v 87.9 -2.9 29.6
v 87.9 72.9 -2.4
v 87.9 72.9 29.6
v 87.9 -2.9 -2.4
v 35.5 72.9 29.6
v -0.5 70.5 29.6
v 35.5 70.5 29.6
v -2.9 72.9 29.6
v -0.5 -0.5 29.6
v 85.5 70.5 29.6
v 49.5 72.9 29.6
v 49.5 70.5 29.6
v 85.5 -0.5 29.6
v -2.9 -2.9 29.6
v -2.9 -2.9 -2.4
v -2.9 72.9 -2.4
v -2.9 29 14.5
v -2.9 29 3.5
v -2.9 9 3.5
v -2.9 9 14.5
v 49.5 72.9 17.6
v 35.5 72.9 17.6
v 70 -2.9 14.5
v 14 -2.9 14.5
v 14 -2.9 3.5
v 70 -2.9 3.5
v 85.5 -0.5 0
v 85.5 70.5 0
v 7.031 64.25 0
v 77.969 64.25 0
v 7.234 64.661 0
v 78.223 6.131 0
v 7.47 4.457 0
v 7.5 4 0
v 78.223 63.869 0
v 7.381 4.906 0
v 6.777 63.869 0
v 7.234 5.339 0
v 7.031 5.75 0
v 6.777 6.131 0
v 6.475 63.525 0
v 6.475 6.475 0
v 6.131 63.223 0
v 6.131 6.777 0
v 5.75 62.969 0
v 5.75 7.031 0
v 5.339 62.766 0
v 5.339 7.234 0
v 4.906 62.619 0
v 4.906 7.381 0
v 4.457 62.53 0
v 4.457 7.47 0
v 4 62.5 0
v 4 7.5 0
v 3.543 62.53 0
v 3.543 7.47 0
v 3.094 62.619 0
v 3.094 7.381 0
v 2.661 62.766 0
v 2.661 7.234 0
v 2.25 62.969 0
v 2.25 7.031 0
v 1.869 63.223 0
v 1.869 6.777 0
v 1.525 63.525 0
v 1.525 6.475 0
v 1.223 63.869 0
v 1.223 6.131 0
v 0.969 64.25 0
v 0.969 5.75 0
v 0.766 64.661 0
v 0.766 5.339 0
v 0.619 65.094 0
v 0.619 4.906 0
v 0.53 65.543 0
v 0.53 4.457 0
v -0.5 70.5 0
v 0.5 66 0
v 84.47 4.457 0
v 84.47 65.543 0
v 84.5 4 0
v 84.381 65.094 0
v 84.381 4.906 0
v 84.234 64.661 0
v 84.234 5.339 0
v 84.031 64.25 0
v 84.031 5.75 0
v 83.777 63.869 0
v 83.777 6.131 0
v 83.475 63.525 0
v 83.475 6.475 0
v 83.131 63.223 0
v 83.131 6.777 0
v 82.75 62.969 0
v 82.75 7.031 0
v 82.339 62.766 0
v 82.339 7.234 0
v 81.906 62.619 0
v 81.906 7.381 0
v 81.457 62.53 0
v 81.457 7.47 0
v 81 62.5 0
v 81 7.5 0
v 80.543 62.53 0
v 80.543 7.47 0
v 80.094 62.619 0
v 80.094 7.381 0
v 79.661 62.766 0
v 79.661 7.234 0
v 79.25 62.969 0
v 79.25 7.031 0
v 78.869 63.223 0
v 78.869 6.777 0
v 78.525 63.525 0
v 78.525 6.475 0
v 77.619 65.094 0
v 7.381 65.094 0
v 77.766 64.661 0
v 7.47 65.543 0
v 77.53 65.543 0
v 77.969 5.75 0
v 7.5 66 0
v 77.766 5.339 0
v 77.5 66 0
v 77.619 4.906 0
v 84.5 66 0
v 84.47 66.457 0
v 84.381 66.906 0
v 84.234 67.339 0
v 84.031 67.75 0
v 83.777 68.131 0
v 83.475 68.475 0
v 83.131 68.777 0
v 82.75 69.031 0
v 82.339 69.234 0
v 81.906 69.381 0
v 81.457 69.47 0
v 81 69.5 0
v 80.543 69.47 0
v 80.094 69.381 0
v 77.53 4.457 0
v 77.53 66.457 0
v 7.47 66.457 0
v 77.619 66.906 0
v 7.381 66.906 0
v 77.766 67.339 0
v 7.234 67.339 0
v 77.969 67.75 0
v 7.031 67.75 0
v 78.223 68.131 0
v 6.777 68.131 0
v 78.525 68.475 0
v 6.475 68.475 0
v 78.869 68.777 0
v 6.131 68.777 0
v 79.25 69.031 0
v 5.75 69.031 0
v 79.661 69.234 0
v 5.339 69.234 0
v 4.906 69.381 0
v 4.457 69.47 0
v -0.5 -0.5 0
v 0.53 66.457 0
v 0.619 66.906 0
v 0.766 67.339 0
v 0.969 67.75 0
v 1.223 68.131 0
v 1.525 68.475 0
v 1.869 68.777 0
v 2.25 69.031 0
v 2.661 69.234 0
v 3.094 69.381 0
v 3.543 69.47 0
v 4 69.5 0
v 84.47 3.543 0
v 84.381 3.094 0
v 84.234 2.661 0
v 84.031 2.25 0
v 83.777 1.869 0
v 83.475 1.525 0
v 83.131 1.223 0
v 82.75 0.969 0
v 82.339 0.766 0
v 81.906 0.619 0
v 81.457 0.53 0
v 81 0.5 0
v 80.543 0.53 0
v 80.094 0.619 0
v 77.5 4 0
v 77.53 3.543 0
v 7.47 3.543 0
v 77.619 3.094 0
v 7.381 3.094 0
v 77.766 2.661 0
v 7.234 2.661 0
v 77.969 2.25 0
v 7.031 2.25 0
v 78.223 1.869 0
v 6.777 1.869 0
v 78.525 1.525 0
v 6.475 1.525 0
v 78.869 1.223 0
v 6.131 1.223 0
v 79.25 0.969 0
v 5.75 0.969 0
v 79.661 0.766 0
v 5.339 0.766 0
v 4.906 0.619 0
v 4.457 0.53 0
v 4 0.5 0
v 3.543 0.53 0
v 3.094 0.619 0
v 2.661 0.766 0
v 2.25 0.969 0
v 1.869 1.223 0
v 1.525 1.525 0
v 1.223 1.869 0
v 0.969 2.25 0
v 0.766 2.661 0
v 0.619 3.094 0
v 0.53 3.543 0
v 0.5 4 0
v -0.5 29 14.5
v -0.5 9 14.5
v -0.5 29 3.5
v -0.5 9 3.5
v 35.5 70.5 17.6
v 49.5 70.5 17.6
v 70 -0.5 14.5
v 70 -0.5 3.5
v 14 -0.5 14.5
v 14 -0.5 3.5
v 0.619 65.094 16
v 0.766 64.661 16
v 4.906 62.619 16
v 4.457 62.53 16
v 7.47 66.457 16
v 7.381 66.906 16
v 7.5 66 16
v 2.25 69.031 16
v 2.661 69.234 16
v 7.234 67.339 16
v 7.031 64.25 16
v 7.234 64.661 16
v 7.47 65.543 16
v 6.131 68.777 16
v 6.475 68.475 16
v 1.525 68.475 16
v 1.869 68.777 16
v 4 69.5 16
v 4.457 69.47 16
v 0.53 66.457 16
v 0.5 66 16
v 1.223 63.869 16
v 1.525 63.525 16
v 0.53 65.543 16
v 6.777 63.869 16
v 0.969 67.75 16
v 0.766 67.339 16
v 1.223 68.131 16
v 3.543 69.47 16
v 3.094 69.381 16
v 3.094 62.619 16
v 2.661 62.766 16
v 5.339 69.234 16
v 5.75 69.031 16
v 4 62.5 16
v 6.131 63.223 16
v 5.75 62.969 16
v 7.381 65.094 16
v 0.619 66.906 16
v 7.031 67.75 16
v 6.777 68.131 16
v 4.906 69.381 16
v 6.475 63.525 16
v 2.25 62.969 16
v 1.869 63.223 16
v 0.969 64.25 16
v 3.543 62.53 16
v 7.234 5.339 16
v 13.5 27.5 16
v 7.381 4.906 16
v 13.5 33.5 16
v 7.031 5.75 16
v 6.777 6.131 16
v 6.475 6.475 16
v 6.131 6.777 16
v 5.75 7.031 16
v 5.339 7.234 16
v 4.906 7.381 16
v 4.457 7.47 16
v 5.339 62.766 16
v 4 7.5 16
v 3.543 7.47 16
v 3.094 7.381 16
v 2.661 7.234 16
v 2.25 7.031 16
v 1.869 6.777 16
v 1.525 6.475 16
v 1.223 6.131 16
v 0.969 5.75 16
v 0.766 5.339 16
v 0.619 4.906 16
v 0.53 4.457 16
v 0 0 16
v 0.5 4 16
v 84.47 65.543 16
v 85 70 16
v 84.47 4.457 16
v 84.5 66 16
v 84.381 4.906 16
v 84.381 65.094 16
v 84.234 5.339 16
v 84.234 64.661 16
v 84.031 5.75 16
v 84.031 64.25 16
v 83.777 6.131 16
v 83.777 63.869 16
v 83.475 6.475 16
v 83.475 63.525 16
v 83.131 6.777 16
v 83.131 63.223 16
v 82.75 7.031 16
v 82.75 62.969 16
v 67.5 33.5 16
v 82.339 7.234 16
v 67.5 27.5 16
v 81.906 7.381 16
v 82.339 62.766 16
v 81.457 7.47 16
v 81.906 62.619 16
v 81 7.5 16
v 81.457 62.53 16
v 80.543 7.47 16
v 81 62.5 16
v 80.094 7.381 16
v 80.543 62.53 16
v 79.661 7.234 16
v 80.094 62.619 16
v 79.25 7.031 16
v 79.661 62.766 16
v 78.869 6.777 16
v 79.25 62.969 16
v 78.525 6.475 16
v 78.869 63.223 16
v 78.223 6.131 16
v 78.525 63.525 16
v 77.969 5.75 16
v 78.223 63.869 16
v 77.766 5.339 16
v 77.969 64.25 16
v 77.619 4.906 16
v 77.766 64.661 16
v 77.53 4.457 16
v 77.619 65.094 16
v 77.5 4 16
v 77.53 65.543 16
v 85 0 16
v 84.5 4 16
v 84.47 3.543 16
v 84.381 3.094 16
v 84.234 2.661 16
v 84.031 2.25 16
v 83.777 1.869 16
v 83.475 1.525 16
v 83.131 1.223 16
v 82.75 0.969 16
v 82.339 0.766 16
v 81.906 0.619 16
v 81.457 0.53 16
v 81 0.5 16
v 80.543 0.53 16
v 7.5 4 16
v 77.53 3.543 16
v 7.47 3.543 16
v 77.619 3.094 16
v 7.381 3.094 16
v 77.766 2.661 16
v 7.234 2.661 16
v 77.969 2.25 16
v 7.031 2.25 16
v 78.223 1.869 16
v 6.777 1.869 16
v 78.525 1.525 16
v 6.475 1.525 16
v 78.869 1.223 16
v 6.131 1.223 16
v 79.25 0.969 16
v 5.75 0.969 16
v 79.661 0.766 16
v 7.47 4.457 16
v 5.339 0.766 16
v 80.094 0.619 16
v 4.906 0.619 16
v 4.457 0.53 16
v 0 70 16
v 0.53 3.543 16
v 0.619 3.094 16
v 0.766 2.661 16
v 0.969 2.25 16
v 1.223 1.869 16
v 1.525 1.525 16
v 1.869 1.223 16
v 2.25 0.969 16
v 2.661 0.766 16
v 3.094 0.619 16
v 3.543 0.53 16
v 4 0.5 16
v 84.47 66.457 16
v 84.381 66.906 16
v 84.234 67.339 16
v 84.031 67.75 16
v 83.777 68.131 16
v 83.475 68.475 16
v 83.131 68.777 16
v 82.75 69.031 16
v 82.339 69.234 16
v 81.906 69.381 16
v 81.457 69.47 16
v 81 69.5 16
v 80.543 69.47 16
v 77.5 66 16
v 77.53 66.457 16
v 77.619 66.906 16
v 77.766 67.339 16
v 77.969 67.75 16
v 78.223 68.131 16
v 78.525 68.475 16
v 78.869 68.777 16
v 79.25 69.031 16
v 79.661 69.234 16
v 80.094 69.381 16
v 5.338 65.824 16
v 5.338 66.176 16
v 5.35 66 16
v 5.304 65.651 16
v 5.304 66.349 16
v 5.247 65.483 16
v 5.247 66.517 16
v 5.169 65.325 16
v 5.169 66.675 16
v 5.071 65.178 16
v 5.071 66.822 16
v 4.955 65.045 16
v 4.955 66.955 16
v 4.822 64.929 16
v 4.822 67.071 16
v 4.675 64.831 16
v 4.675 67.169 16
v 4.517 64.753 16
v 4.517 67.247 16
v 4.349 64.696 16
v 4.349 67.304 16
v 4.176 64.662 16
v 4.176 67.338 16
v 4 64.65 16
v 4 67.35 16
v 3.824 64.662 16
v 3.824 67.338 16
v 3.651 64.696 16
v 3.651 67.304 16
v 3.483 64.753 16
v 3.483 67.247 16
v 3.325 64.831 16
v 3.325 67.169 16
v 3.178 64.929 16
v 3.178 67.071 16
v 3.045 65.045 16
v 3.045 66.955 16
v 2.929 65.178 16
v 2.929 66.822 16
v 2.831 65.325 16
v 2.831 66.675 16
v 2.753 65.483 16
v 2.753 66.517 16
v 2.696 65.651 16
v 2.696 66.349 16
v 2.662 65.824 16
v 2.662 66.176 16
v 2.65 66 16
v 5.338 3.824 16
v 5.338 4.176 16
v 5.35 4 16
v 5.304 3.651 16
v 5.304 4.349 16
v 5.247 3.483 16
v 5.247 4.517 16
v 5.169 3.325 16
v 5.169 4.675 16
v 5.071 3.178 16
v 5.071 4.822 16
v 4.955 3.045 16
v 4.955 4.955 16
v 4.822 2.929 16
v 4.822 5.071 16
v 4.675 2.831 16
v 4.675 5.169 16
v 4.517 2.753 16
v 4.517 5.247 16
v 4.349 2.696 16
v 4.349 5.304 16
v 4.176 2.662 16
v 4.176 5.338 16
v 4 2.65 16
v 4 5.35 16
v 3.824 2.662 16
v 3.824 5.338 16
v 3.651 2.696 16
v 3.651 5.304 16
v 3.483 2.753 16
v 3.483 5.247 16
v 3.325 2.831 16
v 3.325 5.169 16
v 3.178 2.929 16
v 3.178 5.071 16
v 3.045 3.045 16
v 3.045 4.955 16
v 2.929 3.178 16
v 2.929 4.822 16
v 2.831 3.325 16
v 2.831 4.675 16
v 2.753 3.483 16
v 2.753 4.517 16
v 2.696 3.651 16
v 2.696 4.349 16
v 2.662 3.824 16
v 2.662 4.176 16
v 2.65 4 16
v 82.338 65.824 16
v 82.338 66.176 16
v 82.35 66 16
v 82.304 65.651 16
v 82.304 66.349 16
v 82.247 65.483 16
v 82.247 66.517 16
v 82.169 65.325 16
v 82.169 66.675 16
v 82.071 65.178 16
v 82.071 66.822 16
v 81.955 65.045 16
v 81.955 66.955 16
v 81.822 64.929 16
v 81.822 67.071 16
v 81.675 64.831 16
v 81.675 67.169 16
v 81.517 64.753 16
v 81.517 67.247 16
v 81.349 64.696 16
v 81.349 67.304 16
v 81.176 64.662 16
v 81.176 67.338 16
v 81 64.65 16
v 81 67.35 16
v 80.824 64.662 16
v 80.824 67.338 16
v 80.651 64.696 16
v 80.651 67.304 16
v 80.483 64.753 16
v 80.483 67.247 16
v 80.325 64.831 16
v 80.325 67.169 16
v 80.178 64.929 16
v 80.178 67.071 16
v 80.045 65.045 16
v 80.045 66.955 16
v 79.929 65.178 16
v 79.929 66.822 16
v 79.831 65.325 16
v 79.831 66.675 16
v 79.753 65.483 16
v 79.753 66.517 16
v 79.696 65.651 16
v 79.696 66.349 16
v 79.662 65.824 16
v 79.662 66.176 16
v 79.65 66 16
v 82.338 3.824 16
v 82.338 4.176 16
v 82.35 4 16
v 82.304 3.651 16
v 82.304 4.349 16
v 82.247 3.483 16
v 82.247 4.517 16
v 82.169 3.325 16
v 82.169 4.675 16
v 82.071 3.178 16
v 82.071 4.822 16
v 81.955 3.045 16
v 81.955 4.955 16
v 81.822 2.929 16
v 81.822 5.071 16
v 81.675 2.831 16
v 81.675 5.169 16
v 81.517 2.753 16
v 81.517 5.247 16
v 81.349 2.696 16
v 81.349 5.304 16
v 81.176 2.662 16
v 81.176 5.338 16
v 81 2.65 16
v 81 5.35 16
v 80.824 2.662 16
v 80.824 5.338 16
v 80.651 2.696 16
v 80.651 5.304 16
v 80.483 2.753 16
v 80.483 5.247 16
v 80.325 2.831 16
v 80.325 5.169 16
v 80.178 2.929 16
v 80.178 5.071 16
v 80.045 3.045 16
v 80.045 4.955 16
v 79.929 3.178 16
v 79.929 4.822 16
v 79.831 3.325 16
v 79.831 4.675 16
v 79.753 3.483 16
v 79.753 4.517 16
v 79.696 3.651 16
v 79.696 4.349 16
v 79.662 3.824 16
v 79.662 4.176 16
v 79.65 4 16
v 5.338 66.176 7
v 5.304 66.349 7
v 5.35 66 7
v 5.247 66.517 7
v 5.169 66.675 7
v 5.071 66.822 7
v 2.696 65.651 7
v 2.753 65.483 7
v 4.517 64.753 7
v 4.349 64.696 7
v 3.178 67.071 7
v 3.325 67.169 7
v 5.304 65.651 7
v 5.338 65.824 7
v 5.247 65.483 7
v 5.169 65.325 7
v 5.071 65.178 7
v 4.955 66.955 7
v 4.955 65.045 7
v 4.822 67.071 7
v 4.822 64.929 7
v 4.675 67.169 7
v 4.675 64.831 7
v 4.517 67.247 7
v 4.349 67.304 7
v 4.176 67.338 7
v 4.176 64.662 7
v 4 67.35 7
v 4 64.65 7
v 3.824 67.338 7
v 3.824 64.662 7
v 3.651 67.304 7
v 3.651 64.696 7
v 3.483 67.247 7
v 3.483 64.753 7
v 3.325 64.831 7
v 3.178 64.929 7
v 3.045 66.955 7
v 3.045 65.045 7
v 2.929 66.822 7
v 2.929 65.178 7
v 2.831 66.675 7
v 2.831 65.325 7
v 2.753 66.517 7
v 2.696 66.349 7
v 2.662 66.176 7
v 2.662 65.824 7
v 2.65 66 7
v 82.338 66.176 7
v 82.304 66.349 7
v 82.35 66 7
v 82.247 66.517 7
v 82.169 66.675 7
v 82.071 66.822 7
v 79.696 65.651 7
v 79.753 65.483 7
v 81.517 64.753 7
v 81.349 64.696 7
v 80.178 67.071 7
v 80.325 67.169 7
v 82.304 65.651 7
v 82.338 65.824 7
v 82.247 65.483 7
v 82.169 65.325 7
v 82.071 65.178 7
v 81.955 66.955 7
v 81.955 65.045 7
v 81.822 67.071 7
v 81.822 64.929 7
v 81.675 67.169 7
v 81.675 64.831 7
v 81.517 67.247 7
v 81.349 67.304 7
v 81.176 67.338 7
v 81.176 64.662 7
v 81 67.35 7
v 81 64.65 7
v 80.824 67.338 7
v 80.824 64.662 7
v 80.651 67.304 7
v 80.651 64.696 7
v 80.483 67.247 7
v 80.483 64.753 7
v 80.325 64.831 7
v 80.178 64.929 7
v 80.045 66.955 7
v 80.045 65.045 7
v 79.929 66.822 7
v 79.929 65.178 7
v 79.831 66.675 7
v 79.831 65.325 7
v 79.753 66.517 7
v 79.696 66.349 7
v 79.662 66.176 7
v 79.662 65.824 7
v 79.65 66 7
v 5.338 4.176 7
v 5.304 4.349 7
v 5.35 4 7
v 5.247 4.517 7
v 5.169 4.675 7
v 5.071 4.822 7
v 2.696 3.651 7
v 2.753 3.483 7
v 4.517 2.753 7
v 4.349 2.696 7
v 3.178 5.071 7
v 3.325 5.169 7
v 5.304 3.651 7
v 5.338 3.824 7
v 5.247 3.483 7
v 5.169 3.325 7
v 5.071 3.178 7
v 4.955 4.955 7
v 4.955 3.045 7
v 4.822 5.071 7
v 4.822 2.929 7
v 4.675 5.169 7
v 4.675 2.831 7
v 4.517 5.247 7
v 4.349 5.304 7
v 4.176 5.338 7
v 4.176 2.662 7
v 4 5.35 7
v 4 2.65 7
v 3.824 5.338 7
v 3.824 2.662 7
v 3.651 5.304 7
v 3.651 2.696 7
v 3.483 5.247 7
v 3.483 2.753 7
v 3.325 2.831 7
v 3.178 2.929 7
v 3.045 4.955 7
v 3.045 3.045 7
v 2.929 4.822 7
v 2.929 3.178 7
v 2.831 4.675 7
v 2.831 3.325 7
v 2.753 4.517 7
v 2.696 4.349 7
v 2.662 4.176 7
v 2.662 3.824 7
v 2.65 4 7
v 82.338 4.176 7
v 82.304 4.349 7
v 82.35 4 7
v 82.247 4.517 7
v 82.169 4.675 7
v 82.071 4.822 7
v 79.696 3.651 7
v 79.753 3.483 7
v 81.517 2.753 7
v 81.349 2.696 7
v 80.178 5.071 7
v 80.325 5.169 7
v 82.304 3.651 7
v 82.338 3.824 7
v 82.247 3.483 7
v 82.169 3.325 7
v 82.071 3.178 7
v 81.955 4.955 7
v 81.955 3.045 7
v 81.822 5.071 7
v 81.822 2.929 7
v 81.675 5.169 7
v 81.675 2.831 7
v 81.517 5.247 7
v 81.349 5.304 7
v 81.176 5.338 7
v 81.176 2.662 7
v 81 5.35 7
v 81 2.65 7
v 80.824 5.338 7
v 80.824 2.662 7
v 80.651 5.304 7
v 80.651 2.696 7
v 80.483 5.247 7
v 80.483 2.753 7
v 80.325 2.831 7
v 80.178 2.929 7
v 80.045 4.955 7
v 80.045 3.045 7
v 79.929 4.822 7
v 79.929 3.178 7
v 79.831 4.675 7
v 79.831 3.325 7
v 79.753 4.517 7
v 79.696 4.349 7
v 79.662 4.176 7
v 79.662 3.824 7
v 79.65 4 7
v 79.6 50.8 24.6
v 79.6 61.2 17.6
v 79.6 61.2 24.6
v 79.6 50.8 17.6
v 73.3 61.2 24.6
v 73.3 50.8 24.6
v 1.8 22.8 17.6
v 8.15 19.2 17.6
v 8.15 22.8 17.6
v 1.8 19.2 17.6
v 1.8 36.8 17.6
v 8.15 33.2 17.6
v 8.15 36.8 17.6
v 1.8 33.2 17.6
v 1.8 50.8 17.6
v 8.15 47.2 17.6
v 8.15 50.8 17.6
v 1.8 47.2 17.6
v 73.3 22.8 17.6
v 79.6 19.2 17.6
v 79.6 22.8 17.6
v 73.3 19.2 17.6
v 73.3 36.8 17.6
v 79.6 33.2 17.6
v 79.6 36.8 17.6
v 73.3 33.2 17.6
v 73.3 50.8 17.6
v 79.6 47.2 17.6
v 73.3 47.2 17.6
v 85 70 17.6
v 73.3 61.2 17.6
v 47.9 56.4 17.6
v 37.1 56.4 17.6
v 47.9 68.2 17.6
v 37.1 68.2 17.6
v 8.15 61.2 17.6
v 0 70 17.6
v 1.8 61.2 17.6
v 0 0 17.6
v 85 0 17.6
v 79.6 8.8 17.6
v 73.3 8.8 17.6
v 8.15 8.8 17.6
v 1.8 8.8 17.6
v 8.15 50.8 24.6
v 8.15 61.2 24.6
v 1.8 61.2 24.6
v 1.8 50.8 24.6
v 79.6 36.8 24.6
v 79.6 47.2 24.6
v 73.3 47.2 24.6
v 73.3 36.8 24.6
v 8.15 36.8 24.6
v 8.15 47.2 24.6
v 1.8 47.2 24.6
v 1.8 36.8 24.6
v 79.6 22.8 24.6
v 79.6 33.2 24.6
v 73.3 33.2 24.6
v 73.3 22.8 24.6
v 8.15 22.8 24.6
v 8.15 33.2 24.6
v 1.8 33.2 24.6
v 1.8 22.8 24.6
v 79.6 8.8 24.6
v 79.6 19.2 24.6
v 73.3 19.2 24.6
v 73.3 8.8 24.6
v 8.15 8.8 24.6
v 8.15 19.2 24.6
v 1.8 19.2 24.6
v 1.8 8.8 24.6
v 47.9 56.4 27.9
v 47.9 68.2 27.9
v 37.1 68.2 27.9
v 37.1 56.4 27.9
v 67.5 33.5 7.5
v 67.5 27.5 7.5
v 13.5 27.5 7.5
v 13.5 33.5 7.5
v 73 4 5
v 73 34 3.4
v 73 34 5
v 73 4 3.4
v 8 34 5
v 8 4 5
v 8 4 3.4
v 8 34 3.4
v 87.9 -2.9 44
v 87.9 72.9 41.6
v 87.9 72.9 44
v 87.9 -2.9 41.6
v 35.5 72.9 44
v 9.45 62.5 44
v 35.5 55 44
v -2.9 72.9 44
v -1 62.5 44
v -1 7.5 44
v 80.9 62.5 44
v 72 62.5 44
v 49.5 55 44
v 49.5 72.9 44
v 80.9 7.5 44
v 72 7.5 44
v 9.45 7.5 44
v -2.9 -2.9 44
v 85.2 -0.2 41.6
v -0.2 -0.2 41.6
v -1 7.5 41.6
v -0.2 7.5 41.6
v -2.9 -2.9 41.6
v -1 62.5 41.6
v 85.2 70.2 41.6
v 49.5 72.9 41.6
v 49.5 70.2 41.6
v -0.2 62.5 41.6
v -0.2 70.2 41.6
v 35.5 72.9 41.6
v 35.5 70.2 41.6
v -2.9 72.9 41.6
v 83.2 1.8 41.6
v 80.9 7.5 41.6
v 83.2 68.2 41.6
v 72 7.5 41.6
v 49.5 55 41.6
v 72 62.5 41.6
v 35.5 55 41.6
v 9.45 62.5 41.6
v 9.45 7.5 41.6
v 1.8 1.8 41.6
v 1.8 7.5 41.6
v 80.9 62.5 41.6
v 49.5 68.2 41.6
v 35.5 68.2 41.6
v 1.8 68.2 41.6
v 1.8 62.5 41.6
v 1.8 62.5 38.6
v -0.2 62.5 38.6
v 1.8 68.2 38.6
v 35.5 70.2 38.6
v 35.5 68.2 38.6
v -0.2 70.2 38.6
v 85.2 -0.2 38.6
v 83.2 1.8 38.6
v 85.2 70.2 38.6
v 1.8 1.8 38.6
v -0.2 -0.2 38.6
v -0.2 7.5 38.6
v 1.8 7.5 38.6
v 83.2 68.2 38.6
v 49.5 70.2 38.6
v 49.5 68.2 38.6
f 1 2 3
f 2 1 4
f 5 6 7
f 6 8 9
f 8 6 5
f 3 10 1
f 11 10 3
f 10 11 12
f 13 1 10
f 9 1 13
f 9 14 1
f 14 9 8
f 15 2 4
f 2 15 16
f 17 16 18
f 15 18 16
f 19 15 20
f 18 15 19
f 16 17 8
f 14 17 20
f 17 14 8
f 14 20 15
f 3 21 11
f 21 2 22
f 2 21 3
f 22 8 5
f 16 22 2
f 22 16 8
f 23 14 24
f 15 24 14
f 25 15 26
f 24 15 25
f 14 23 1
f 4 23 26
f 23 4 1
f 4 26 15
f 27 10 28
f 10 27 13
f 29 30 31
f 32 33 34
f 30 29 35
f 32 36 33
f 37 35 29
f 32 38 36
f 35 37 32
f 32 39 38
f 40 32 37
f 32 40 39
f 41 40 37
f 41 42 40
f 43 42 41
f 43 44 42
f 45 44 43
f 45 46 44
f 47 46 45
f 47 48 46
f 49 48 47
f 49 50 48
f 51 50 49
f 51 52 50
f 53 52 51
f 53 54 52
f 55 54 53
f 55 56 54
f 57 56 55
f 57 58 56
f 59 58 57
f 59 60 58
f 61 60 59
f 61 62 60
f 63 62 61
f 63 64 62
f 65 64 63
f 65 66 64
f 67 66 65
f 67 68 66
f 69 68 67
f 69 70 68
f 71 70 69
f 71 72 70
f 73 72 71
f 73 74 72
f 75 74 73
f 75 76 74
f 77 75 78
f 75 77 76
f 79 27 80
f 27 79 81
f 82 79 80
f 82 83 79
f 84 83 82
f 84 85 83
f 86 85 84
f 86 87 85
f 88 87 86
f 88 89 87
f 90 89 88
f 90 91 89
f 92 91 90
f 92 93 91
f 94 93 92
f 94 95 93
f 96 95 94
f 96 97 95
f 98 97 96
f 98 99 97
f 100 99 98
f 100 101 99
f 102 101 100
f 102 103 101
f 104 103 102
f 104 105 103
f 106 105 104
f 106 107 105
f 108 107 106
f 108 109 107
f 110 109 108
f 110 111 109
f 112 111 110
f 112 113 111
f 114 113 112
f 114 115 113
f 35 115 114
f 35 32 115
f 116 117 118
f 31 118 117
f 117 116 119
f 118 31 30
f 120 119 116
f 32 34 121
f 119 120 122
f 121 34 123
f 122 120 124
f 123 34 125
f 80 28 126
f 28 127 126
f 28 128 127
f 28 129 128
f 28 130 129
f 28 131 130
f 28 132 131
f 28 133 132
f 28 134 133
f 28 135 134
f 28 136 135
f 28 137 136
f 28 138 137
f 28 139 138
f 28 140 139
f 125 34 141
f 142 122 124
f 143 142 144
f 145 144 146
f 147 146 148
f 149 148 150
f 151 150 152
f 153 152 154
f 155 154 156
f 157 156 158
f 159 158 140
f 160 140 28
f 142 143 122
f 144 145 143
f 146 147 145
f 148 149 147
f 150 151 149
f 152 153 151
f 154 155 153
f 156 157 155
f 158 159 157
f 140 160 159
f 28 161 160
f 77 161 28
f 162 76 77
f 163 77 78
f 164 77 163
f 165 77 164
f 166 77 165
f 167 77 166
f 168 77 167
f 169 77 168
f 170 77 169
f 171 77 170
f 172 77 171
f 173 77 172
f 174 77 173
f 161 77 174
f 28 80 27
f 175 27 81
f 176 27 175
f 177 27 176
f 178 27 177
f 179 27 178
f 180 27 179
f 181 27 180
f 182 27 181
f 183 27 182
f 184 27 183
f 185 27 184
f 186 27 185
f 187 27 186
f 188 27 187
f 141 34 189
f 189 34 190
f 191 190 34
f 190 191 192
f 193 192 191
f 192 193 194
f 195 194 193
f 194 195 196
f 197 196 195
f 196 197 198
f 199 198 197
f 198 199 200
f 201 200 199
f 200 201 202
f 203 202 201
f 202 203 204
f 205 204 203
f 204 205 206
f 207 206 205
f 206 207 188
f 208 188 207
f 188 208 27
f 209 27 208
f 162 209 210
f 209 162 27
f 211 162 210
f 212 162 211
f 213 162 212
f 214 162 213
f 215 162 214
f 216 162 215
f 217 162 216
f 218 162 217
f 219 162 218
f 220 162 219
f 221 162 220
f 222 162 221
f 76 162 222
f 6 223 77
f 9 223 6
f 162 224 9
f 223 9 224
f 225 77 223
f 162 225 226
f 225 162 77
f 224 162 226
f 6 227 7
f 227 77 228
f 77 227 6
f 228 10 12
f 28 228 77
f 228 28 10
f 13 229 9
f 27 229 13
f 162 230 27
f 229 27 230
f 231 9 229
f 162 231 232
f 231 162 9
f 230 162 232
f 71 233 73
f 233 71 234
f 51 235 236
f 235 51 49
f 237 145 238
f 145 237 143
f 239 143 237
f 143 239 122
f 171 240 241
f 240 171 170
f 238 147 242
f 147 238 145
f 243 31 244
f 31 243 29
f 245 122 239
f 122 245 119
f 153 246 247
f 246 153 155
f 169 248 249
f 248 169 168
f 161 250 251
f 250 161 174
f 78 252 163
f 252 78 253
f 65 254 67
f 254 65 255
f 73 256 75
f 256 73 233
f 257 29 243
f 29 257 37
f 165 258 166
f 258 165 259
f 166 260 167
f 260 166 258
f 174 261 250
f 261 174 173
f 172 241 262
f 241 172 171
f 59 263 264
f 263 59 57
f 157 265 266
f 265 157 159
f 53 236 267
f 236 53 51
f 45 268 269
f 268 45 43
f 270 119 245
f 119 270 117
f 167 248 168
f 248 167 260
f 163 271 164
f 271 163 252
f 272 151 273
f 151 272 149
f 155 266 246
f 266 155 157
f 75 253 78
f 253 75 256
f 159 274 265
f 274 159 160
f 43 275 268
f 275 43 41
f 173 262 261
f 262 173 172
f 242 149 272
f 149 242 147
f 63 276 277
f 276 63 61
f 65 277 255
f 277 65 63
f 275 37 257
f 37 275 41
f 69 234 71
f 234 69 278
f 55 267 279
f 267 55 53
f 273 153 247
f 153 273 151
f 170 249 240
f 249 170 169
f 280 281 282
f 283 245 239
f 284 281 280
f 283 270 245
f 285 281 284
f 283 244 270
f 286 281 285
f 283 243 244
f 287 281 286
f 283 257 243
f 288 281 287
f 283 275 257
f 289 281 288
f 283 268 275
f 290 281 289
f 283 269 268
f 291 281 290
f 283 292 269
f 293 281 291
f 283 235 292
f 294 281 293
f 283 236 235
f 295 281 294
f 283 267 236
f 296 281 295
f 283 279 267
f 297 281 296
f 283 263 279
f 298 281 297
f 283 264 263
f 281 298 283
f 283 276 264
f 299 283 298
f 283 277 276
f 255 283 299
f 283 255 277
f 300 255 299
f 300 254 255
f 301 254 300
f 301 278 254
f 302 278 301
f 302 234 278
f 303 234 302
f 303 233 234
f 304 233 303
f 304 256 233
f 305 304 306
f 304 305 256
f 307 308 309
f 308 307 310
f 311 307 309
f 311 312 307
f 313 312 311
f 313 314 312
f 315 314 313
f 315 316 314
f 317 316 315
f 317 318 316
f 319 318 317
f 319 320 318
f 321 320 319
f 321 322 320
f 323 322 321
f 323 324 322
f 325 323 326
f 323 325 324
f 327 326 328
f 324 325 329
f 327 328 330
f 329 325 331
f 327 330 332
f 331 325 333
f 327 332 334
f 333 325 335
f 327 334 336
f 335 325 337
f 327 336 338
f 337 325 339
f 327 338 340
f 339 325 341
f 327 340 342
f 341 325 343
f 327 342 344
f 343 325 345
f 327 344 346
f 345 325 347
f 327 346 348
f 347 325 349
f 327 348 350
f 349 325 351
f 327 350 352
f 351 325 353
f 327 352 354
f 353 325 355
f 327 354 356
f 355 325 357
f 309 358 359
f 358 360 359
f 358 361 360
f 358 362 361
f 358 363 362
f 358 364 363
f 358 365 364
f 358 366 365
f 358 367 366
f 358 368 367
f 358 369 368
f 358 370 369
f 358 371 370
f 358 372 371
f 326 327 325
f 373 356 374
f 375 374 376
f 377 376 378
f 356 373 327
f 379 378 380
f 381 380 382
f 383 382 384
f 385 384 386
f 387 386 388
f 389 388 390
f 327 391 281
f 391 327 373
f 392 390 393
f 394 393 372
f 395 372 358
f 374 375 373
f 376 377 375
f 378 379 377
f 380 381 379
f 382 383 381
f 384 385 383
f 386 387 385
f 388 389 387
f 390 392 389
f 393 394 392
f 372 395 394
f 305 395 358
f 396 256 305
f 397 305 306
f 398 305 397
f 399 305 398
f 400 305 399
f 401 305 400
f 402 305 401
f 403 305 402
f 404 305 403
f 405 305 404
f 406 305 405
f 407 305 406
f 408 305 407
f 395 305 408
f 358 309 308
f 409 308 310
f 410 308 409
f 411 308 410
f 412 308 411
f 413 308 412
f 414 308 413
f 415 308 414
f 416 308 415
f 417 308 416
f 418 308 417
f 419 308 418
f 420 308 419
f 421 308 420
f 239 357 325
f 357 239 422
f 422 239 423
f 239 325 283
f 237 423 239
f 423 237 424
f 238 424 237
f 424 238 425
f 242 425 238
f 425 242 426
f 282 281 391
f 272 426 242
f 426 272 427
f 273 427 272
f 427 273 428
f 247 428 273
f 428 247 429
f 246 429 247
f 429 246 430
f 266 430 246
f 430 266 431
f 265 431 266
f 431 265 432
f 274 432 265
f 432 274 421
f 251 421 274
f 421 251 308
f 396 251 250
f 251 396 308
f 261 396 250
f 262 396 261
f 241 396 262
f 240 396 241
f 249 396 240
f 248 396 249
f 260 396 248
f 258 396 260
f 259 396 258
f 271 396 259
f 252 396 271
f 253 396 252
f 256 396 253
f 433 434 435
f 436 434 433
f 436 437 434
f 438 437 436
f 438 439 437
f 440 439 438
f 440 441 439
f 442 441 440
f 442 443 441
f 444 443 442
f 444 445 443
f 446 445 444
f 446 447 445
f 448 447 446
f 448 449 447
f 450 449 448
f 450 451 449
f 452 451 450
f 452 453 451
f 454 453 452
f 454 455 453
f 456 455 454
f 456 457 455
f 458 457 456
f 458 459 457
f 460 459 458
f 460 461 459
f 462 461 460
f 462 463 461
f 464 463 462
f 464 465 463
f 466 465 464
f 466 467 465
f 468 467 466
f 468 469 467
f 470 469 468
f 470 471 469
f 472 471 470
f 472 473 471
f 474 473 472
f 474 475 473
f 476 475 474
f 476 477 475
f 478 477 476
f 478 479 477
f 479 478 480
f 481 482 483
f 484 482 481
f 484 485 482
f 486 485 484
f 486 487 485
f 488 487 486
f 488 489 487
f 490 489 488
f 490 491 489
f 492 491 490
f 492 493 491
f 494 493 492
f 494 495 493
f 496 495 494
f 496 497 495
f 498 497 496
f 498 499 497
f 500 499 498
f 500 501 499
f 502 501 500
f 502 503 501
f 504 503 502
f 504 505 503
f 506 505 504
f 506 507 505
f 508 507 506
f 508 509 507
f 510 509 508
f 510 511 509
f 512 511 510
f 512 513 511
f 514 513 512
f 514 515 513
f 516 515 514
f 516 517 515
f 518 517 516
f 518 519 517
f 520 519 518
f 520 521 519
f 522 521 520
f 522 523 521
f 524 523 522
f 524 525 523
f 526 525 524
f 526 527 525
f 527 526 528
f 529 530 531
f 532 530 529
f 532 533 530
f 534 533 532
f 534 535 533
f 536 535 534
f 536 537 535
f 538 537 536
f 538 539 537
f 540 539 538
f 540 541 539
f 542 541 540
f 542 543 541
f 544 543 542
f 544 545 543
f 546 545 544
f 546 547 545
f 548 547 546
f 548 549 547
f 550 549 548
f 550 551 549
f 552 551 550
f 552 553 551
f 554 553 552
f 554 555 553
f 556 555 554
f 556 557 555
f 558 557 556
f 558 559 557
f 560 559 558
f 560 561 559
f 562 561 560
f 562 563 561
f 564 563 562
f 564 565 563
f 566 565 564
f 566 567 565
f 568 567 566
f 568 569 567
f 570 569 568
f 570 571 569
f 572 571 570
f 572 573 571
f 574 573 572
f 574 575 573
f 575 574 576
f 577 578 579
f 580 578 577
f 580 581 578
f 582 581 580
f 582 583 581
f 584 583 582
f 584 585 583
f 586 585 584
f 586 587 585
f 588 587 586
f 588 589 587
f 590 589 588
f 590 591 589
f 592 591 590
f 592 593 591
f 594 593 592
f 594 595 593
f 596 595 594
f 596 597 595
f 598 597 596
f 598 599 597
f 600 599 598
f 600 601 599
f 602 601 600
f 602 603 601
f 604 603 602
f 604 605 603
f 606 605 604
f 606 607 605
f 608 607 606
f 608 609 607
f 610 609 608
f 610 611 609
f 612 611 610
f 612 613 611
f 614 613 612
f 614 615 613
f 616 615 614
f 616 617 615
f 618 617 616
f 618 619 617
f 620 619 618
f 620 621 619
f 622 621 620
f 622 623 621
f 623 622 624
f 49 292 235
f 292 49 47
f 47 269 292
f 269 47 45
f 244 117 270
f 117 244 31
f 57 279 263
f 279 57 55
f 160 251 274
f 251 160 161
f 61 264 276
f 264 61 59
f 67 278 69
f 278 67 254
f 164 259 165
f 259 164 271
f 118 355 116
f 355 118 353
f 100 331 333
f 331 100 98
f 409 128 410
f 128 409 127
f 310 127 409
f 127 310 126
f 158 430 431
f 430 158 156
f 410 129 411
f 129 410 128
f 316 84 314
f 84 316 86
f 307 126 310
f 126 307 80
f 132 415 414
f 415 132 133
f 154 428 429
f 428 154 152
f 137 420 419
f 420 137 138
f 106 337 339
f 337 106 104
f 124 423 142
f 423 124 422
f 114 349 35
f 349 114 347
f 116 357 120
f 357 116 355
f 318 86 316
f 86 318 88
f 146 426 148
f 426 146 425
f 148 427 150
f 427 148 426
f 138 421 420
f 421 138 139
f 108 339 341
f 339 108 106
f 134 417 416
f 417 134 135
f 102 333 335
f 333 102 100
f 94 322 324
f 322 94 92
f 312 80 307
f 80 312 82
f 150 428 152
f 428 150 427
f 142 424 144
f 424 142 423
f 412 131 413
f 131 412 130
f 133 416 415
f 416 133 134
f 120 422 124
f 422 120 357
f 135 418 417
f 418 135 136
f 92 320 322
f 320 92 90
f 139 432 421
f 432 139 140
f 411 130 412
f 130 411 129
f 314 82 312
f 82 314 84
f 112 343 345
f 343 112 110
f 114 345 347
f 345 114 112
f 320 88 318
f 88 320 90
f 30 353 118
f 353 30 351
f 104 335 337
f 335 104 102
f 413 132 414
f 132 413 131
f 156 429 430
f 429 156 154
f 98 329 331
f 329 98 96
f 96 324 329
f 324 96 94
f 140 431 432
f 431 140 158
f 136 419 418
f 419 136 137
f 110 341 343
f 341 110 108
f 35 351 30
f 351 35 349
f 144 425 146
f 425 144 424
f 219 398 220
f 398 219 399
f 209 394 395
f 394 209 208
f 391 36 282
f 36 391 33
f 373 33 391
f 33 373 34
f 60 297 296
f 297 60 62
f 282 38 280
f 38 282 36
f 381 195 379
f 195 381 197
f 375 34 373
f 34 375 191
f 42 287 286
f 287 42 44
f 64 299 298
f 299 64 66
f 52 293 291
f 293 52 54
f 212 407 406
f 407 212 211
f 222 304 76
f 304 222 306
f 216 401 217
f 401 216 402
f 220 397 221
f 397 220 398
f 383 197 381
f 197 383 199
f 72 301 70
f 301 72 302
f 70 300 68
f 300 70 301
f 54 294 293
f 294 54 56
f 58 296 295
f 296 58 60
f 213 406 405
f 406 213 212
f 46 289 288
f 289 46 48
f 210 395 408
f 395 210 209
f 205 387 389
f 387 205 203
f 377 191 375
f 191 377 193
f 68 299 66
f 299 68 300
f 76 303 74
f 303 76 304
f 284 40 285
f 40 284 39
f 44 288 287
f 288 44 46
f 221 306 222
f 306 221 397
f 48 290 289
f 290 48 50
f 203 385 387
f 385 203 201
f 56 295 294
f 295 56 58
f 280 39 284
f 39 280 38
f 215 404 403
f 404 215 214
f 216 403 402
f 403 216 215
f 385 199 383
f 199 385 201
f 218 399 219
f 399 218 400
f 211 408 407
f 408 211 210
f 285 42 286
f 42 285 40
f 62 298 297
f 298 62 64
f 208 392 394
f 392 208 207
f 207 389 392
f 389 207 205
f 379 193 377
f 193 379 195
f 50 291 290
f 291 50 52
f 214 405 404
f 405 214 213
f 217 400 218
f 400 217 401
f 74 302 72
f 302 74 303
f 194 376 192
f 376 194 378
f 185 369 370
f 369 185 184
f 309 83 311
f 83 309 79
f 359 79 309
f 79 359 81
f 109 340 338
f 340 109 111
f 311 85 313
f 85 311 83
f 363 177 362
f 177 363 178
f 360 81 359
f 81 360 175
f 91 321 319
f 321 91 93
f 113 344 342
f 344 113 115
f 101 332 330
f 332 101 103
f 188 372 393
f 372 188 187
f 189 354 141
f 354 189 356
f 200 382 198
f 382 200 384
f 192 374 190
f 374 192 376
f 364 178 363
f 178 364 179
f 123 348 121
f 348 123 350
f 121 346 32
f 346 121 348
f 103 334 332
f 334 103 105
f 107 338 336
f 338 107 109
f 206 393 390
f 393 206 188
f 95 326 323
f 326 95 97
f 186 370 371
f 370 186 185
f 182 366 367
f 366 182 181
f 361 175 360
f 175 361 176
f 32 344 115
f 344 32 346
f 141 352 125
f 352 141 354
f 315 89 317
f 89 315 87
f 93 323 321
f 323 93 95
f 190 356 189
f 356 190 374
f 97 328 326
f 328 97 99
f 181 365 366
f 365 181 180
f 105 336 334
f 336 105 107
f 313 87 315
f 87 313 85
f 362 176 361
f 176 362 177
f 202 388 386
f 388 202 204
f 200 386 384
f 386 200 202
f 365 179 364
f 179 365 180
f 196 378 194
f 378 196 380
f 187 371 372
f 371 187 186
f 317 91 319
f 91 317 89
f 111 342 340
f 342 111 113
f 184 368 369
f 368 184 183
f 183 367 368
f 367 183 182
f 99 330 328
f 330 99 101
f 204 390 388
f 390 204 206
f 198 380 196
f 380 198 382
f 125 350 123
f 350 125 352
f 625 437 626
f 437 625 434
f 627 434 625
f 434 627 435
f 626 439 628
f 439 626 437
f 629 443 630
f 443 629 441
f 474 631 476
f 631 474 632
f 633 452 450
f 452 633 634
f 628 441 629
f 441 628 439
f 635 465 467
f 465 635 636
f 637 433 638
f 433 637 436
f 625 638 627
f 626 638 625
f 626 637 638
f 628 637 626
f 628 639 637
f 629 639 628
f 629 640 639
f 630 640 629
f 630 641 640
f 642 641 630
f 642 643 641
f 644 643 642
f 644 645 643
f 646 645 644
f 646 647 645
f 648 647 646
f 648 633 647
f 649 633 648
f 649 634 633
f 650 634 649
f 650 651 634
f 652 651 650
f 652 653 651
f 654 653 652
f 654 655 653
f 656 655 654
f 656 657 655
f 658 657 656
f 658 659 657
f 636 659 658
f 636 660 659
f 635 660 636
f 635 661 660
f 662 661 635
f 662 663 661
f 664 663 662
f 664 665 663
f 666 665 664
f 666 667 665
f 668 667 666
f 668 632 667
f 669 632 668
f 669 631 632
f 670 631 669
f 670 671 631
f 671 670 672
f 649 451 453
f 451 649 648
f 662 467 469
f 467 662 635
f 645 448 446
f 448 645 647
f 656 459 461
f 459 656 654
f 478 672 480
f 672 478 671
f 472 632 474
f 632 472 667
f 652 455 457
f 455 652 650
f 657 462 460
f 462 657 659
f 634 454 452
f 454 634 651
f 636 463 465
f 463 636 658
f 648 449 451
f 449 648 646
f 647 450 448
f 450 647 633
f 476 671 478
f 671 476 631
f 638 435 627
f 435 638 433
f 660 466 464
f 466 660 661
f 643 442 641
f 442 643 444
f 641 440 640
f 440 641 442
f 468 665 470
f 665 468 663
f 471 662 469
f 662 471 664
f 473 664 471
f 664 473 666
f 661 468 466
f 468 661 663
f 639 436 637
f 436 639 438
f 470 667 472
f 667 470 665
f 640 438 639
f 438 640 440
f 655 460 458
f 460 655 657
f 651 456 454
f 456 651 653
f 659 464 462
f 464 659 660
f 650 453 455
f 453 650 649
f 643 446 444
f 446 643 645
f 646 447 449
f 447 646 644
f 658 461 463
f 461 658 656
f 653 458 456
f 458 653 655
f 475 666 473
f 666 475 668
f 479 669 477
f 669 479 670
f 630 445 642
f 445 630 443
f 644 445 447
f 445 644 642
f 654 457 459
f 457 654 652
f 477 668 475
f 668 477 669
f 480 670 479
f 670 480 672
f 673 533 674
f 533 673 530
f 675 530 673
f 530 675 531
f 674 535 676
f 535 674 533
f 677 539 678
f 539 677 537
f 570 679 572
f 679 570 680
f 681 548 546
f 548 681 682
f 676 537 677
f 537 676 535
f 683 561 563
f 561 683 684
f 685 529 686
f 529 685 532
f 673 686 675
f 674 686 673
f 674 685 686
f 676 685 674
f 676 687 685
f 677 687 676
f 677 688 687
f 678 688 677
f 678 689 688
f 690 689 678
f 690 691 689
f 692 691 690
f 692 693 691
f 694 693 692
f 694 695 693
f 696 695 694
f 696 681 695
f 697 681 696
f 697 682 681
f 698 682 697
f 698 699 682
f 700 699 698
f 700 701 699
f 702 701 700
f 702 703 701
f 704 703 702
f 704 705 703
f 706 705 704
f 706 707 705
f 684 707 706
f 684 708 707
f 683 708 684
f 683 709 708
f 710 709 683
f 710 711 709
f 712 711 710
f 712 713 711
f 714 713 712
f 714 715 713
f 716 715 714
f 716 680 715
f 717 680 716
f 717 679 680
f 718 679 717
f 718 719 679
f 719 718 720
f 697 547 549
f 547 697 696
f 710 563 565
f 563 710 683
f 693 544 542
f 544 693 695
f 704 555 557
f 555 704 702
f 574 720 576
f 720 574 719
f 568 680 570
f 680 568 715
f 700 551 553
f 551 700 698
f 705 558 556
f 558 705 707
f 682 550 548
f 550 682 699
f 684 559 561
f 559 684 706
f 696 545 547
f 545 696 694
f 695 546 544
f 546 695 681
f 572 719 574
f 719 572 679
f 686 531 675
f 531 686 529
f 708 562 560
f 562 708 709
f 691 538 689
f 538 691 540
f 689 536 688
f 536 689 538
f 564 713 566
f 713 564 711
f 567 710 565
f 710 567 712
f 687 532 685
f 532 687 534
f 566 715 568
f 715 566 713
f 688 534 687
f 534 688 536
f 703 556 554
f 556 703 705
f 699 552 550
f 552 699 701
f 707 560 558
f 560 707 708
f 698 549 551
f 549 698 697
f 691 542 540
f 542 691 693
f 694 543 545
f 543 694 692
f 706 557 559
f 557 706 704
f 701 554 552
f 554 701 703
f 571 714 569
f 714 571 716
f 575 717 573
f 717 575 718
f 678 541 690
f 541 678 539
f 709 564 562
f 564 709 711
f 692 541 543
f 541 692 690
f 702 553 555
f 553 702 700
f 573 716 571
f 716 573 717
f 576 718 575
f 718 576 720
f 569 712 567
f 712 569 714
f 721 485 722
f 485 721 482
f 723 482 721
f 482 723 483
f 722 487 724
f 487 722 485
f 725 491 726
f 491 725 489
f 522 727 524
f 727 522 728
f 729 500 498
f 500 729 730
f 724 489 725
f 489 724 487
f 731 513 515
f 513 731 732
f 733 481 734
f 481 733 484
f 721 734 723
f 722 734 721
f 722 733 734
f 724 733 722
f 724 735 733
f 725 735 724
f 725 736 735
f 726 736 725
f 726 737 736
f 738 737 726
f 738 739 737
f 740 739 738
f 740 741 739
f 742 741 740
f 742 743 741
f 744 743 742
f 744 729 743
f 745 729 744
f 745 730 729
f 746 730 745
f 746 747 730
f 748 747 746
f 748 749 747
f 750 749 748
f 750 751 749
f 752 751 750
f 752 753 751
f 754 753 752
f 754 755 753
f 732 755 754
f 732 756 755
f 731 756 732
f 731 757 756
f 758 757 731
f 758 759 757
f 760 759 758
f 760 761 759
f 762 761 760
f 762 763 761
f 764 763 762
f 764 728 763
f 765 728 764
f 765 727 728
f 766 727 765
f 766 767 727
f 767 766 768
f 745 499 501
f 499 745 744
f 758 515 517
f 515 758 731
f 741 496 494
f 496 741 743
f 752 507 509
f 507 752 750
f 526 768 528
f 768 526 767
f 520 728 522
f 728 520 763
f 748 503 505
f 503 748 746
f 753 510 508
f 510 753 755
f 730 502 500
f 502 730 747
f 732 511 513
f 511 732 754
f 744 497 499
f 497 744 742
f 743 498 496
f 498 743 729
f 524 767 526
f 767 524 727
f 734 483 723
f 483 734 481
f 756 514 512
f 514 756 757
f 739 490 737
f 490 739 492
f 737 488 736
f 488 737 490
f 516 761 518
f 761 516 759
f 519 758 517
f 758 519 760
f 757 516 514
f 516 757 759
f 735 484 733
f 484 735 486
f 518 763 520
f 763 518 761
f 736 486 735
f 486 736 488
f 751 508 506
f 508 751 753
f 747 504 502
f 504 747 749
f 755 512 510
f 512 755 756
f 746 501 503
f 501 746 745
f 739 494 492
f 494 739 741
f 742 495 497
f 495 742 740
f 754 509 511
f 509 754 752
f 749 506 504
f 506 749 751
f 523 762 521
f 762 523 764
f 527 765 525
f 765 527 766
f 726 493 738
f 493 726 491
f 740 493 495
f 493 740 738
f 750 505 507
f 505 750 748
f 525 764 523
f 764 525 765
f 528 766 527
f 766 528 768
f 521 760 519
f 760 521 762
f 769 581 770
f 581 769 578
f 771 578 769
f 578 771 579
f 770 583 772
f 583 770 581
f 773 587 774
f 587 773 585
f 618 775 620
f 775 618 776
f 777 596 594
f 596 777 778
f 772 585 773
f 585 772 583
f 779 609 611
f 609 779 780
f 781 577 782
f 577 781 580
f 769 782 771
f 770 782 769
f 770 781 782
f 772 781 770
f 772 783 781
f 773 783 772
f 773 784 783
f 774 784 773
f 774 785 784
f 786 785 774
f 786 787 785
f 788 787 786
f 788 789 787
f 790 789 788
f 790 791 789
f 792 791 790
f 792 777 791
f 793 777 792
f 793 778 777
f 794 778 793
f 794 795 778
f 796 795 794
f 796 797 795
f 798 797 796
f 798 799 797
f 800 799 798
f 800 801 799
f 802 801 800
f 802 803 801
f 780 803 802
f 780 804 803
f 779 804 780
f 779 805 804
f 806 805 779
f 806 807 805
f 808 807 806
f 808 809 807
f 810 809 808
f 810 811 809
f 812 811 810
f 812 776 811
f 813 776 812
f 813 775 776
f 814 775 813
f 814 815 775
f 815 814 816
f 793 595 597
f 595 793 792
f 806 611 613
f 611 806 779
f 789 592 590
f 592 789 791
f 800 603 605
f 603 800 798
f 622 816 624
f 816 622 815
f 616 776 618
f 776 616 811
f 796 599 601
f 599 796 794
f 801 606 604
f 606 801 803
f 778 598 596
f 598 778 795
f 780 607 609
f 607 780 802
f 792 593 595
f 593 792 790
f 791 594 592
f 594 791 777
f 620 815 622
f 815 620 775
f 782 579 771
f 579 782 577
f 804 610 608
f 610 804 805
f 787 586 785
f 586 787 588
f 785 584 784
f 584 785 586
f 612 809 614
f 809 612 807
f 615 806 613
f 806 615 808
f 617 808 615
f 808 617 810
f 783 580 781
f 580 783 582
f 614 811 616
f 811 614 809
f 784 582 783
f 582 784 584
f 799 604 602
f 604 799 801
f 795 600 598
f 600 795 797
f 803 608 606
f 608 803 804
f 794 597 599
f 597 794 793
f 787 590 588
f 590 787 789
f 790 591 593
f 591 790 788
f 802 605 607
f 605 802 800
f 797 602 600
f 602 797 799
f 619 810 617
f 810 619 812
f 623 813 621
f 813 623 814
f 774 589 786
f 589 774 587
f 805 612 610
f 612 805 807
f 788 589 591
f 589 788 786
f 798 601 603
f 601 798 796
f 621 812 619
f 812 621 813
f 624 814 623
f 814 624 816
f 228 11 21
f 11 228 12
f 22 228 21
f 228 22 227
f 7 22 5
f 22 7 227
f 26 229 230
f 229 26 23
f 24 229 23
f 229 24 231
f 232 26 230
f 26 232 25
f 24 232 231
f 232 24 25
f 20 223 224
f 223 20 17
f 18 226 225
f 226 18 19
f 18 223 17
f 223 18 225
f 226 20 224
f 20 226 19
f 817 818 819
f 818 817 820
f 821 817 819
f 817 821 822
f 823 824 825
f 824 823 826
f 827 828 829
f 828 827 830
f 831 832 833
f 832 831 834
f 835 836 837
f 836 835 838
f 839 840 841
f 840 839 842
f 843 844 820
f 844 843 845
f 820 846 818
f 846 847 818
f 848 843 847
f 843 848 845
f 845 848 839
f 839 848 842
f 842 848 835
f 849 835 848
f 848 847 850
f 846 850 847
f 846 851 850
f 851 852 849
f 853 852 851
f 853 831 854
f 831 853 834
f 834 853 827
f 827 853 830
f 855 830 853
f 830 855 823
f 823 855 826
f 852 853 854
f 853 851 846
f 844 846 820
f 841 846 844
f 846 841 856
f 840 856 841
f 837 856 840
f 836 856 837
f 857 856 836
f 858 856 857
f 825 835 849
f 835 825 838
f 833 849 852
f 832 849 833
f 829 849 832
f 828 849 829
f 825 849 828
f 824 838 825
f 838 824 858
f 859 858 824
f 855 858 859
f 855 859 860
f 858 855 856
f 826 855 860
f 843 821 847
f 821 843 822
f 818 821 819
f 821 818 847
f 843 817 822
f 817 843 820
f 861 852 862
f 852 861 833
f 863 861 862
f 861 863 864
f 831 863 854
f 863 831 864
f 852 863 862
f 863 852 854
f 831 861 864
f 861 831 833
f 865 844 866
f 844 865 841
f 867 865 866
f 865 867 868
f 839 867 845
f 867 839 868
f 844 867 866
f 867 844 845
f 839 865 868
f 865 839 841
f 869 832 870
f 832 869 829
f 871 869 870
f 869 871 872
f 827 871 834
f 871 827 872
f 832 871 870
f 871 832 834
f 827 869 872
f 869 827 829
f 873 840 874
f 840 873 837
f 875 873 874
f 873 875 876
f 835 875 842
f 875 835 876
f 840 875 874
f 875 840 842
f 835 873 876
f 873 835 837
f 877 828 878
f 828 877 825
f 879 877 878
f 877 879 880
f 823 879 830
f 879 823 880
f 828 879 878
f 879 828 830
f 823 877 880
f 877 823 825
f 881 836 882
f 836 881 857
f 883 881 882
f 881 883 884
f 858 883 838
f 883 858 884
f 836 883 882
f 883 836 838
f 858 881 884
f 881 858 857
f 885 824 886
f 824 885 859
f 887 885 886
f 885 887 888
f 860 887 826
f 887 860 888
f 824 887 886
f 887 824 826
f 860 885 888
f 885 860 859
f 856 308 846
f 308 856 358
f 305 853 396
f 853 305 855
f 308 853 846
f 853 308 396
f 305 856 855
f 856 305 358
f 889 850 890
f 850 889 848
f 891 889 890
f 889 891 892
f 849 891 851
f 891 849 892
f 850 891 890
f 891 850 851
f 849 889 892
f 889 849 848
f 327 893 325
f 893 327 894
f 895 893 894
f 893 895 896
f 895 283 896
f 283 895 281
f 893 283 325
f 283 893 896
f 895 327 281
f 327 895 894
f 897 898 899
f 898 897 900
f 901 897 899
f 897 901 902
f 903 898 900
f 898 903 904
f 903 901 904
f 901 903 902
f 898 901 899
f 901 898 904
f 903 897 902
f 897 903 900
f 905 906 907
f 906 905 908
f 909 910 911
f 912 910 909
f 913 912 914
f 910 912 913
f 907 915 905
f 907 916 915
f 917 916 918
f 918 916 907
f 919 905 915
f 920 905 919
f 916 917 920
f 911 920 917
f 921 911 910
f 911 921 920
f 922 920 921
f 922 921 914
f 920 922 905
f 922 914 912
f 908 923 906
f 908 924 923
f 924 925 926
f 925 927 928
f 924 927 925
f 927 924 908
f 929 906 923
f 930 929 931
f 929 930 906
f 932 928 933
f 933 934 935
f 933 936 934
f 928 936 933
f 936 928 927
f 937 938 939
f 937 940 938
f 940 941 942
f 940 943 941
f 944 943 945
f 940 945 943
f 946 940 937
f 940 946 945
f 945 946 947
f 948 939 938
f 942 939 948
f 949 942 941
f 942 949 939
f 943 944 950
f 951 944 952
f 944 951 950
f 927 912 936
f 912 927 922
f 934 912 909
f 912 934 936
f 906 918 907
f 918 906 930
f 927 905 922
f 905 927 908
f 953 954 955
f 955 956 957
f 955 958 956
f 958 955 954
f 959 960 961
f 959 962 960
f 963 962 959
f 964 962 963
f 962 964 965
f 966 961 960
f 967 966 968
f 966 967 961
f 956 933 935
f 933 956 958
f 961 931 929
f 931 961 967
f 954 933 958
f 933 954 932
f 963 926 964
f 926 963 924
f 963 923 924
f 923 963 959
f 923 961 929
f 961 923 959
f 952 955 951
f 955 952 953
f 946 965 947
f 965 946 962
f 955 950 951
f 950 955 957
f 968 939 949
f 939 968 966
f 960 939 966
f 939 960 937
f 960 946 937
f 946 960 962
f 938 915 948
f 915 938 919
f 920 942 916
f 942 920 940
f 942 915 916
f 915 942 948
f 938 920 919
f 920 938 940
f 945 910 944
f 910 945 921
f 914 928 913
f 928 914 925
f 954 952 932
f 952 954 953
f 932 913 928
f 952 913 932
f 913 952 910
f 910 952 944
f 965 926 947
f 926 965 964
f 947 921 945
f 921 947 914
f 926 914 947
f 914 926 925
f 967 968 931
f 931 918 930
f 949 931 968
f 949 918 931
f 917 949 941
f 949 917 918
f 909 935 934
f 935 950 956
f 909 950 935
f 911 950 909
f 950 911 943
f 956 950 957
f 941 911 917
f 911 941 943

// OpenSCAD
// 3D-printable case for "gLED Controller simple" (led-controller-simple.kicad_pcb)
// -------------------------------------------------------------------------------
// Two parts: a TRAY the PCB screws into (M3 self-tapping into corner bosses,
// same holes H5-H8 the board already has) and a friction-fit LID with openings
// above every top-entry connector.
//
// The Pi Zero 2 WH hangs UNDER the PCB (socket on the PCB back, Pi on M2.5
// standoffs), so the tray provides 16 mm of depth below the board plus port /
// SD-card openings in the lower walls.
//
// All positions are taken from build_board.py and entered in KICAD board
// coordinates (origin at board top-left, y pointing DOWN). The krect() helper
// flips y so the printed case matches the physical board.
//
// Render:
//   part = "tray"      -> printable tray (prints as modeled, no supports)
//   part = "lid"       -> printable lid  (already flipped flat on the bed)
//   part = "assembly"  -> tray + ghost board + lid hovering (visual check only)

part = "assembly";

// ---------------- board facts (kicad coords, mm) ----------------
W  = 85;      // board size
H  = 70;
PCB_T = 1.6;

M3_HOLES = [[4, 4], [81, 4], [4, 66], [81, 66]];   // H5-H8

JY = [11.5, 25.5, 39.5, 53.5];   // JST pin-1 rows (both columns)
// JST XH body bounding boxes (from footprint courtyard, minus its 0.25 margin)
JST_R = [73.3, 79.6];            // right column J2-J5, body x-range
JST_L = [1.8, 8.15];             // left column J7-J10, body x-range
JST_DY = [-2.7, 7.7];            // body y-range relative to pin-1 row
JST_HT = 7.0;                    // body height above PCB

J1_BOX = [37.1, 1.8, 47.9, 13.6];  // terminal block body x0,y0,x1,y1
J1_HT  = 10.3;

// Pi Zero 2 WH under the board: top face 11 mm below PCB bottom
PI_BOX  = [8, 36, 73, 66];       // outline in board coords
PI_DROP = 11;                    // PCB bottom -> Pi component face
PI_T    = 1.6;
// port centers on the Pi edge that faces the board's bottom edge (y = 70):
// mini-HDMI x=20.4, USB-OTG x=49.4, USB-PWR x=62 (board coords)

// ---------------- case parameters ----------------
clr     = 0.5;    // gap board edge -> inner wall
wall    = 2.4;
floor_t = 2.4;
below   = 16;     // interior floor -> PCB bottom (socket 8.5 + Pi 11+1.6 + air)
above   = 12;     // PCB top -> wall top (J1 is 10.3 tall)
boss_d  = 7;
pilot_d = 2.7;    // M3 self-tapping
pilot_depth = 9;

lid_t   = 2.4;
lip_h   = 3;      // friction lip reaching into the tray
lip_w   = 2;
lip_clr = 0.3;    // lip -> inner wall clearance

$fn = 48;

// ---------------- derived ----------------
pcb_bot  = below;            // z of PCB underside (z=0 = interior floor)
pcb_top  = below + PCB_T;
wall_top = pcb_top + above;

ix0 = -clr;      ix1 = W + clr;      // interior cavity
iy0 = -clr;      iy1 = H + clr;
ox0 = ix0 - wall; ox1 = ix1 + wall;  // outer shell
oy0 = iy0 - wall; oy1 = iy1 + wall;

echo(str("outer size: ", ox1 - ox0, " x ", oy1 - oy0, " x ",
         floor_t + wall_top + lid_t, " mm (tray + lid)"));

// cube from kicad-coordinate corners (flips y), z absolute
module krect(x0, y0, x1, y1, z0, z1) {
    translate([x0, H - y1, z0]) cube([x1 - x0, y1 - y0, z1 - z0]);
}

// ---------------- tray ----------------
module tray() {
    difference() {
        union() {
            // shell with floor, cavity carved out
            difference() {
                translate([ox0, H - iy1 - wall, -floor_t])
                    cube([ox1 - ox0, oy1 - oy0, floor_t + wall_top]);
                krect(ix0, iy0, ix1, iy1, 0, wall_top + 1);
            }
            // corner bosses the PCB screws onto
            for (p = M3_HOLES)
                translate([p[0], H - p[1], 0]) cylinder(d = boss_d, h = below);
        }
        // J1 wire/screwdriver notch, wall at the board's top edge
        krect(35.5, -clr - wall - 1, 49.5, 1, pcb_top, wall_top + 1);
        // Pi port slot (mini-HDMI / USB), wall at the board's bottom edge
        krect(14, H - 1, 70, H + clr + wall + 1, 3.5, 14.5);
        // SD-card slot, left wall
        krect(-clr - wall - 1, 41, 1, 61, 3.5, 14.5);
        // pilot holes in the bosses
        for (p = M3_HOLES)
            translate([p[0], H - p[1], below - pilot_depth])
                cylinder(d = pilot_d, h = pilot_depth + 1);
    }
}

// ---------------- lid (modeled in mounted position) ----------------
module lid_in_place() {
    difference() {
        union() {
            translate([ox0, H - iy1 - wall, wall_top])
                cube([ox1 - ox0, oy1 - oy0, lid_t]);
            // friction lip
            translate([0, 0, wall_top - lip_h]) linear_extrude(lip_h)
                difference() {
                    translate([ix0 + lip_clr, H - iy1 + lip_clr])
                        square([(ix1 - ix0) - 2 * lip_clr,
                                (iy1 - iy0) - 2 * lip_clr]);
                    translate([ix0 + lip_clr + lip_w, H - iy1 + lip_clr + lip_w])
                        square([(ix1 - ix0) - 2 * (lip_clr + lip_w),
                                (iy1 - iy0) - 2 * (lip_clr + lip_w)]);
                }
        }
        // opening above right JST column (J2-J5, strip plugs + wires)
        krect(JST_R[0] - 1.3, JY[0] + JST_DY[0] - 1.3, JST_R[1] + 1.3,
              JY[3] + JST_DY[1] + 1.3, wall_top - lip_h - 1, wall_top + lid_t + 1);
        // opening above left JST column (J7-J10, power plugs). Cut from x=-1,
        // all the way through the lip: the connectors sit so close to the board
        // edge that stopping at the body would leave a 0.7 mm lip sliver.
        krect(-1, JY[0] + JST_DY[0] - 1.3, JST_L[1] + 1.3,
              JY[3] + JST_DY[1] + 1.3, wall_top - lip_h - 1, wall_top + lid_t + 1);
        // J1 access: open to the board edge so supply wires drop in
        krect(35.5, -clr - wall - 2, 49.5, 15, wall_top - lip_h - 1,
              wall_top + lid_t + 1);
    }
}

// lid flipped flat on the print bed (top face down)
module lid_print() {
    translate([0, 0, wall_top + lid_t]) rotate([180, 0, 0]) lid_in_place();
}

// ---------------- ghost board for the assembly view ----------------
module board_ghost() {
    color("darkgreen", 0.85) krect(0, 0, W, H, pcb_bot, pcb_top);
    color("limegreen", 0.9)                        // J1 terminal block
        krect(J1_BOX[0], J1_BOX[1], J1_BOX[2], J1_BOX[3],
              pcb_top, pcb_top + J1_HT);
    color("white", 0.9) for (y = JY) {             // 8x JST XH
        krect(JST_R[0], y + JST_DY[0], JST_R[1], y + JST_DY[1],
              pcb_top, pcb_top + JST_HT);
        krect(JST_L[0], y + JST_DY[0], JST_L[1], y + JST_DY[1],
              pcb_top, pcb_top + JST_HT);
    }
    color("dimgray", 0.9)                          // 2x20 socket on the back
        krect(13.5, 36.5, 67.5, 42.5, pcb_bot - 8.5, pcb_bot);
    color("forestgreen", 0.85)                     // Pi Zero 2 WH
        krect(PI_BOX[0], PI_BOX[1], PI_BOX[2], PI_BOX[3],
              pcb_bot - PI_DROP - PI_T, pcb_bot - PI_DROP);
}

// ---------------- part selection ----------------
if (part == "tray") tray();
if (part == "lid") lid_print();
if (part == "assembly") {
    tray();
    board_ghost();
    color("steelblue", 0.45) translate([0, 0, 12]) lid_in_place();
}
